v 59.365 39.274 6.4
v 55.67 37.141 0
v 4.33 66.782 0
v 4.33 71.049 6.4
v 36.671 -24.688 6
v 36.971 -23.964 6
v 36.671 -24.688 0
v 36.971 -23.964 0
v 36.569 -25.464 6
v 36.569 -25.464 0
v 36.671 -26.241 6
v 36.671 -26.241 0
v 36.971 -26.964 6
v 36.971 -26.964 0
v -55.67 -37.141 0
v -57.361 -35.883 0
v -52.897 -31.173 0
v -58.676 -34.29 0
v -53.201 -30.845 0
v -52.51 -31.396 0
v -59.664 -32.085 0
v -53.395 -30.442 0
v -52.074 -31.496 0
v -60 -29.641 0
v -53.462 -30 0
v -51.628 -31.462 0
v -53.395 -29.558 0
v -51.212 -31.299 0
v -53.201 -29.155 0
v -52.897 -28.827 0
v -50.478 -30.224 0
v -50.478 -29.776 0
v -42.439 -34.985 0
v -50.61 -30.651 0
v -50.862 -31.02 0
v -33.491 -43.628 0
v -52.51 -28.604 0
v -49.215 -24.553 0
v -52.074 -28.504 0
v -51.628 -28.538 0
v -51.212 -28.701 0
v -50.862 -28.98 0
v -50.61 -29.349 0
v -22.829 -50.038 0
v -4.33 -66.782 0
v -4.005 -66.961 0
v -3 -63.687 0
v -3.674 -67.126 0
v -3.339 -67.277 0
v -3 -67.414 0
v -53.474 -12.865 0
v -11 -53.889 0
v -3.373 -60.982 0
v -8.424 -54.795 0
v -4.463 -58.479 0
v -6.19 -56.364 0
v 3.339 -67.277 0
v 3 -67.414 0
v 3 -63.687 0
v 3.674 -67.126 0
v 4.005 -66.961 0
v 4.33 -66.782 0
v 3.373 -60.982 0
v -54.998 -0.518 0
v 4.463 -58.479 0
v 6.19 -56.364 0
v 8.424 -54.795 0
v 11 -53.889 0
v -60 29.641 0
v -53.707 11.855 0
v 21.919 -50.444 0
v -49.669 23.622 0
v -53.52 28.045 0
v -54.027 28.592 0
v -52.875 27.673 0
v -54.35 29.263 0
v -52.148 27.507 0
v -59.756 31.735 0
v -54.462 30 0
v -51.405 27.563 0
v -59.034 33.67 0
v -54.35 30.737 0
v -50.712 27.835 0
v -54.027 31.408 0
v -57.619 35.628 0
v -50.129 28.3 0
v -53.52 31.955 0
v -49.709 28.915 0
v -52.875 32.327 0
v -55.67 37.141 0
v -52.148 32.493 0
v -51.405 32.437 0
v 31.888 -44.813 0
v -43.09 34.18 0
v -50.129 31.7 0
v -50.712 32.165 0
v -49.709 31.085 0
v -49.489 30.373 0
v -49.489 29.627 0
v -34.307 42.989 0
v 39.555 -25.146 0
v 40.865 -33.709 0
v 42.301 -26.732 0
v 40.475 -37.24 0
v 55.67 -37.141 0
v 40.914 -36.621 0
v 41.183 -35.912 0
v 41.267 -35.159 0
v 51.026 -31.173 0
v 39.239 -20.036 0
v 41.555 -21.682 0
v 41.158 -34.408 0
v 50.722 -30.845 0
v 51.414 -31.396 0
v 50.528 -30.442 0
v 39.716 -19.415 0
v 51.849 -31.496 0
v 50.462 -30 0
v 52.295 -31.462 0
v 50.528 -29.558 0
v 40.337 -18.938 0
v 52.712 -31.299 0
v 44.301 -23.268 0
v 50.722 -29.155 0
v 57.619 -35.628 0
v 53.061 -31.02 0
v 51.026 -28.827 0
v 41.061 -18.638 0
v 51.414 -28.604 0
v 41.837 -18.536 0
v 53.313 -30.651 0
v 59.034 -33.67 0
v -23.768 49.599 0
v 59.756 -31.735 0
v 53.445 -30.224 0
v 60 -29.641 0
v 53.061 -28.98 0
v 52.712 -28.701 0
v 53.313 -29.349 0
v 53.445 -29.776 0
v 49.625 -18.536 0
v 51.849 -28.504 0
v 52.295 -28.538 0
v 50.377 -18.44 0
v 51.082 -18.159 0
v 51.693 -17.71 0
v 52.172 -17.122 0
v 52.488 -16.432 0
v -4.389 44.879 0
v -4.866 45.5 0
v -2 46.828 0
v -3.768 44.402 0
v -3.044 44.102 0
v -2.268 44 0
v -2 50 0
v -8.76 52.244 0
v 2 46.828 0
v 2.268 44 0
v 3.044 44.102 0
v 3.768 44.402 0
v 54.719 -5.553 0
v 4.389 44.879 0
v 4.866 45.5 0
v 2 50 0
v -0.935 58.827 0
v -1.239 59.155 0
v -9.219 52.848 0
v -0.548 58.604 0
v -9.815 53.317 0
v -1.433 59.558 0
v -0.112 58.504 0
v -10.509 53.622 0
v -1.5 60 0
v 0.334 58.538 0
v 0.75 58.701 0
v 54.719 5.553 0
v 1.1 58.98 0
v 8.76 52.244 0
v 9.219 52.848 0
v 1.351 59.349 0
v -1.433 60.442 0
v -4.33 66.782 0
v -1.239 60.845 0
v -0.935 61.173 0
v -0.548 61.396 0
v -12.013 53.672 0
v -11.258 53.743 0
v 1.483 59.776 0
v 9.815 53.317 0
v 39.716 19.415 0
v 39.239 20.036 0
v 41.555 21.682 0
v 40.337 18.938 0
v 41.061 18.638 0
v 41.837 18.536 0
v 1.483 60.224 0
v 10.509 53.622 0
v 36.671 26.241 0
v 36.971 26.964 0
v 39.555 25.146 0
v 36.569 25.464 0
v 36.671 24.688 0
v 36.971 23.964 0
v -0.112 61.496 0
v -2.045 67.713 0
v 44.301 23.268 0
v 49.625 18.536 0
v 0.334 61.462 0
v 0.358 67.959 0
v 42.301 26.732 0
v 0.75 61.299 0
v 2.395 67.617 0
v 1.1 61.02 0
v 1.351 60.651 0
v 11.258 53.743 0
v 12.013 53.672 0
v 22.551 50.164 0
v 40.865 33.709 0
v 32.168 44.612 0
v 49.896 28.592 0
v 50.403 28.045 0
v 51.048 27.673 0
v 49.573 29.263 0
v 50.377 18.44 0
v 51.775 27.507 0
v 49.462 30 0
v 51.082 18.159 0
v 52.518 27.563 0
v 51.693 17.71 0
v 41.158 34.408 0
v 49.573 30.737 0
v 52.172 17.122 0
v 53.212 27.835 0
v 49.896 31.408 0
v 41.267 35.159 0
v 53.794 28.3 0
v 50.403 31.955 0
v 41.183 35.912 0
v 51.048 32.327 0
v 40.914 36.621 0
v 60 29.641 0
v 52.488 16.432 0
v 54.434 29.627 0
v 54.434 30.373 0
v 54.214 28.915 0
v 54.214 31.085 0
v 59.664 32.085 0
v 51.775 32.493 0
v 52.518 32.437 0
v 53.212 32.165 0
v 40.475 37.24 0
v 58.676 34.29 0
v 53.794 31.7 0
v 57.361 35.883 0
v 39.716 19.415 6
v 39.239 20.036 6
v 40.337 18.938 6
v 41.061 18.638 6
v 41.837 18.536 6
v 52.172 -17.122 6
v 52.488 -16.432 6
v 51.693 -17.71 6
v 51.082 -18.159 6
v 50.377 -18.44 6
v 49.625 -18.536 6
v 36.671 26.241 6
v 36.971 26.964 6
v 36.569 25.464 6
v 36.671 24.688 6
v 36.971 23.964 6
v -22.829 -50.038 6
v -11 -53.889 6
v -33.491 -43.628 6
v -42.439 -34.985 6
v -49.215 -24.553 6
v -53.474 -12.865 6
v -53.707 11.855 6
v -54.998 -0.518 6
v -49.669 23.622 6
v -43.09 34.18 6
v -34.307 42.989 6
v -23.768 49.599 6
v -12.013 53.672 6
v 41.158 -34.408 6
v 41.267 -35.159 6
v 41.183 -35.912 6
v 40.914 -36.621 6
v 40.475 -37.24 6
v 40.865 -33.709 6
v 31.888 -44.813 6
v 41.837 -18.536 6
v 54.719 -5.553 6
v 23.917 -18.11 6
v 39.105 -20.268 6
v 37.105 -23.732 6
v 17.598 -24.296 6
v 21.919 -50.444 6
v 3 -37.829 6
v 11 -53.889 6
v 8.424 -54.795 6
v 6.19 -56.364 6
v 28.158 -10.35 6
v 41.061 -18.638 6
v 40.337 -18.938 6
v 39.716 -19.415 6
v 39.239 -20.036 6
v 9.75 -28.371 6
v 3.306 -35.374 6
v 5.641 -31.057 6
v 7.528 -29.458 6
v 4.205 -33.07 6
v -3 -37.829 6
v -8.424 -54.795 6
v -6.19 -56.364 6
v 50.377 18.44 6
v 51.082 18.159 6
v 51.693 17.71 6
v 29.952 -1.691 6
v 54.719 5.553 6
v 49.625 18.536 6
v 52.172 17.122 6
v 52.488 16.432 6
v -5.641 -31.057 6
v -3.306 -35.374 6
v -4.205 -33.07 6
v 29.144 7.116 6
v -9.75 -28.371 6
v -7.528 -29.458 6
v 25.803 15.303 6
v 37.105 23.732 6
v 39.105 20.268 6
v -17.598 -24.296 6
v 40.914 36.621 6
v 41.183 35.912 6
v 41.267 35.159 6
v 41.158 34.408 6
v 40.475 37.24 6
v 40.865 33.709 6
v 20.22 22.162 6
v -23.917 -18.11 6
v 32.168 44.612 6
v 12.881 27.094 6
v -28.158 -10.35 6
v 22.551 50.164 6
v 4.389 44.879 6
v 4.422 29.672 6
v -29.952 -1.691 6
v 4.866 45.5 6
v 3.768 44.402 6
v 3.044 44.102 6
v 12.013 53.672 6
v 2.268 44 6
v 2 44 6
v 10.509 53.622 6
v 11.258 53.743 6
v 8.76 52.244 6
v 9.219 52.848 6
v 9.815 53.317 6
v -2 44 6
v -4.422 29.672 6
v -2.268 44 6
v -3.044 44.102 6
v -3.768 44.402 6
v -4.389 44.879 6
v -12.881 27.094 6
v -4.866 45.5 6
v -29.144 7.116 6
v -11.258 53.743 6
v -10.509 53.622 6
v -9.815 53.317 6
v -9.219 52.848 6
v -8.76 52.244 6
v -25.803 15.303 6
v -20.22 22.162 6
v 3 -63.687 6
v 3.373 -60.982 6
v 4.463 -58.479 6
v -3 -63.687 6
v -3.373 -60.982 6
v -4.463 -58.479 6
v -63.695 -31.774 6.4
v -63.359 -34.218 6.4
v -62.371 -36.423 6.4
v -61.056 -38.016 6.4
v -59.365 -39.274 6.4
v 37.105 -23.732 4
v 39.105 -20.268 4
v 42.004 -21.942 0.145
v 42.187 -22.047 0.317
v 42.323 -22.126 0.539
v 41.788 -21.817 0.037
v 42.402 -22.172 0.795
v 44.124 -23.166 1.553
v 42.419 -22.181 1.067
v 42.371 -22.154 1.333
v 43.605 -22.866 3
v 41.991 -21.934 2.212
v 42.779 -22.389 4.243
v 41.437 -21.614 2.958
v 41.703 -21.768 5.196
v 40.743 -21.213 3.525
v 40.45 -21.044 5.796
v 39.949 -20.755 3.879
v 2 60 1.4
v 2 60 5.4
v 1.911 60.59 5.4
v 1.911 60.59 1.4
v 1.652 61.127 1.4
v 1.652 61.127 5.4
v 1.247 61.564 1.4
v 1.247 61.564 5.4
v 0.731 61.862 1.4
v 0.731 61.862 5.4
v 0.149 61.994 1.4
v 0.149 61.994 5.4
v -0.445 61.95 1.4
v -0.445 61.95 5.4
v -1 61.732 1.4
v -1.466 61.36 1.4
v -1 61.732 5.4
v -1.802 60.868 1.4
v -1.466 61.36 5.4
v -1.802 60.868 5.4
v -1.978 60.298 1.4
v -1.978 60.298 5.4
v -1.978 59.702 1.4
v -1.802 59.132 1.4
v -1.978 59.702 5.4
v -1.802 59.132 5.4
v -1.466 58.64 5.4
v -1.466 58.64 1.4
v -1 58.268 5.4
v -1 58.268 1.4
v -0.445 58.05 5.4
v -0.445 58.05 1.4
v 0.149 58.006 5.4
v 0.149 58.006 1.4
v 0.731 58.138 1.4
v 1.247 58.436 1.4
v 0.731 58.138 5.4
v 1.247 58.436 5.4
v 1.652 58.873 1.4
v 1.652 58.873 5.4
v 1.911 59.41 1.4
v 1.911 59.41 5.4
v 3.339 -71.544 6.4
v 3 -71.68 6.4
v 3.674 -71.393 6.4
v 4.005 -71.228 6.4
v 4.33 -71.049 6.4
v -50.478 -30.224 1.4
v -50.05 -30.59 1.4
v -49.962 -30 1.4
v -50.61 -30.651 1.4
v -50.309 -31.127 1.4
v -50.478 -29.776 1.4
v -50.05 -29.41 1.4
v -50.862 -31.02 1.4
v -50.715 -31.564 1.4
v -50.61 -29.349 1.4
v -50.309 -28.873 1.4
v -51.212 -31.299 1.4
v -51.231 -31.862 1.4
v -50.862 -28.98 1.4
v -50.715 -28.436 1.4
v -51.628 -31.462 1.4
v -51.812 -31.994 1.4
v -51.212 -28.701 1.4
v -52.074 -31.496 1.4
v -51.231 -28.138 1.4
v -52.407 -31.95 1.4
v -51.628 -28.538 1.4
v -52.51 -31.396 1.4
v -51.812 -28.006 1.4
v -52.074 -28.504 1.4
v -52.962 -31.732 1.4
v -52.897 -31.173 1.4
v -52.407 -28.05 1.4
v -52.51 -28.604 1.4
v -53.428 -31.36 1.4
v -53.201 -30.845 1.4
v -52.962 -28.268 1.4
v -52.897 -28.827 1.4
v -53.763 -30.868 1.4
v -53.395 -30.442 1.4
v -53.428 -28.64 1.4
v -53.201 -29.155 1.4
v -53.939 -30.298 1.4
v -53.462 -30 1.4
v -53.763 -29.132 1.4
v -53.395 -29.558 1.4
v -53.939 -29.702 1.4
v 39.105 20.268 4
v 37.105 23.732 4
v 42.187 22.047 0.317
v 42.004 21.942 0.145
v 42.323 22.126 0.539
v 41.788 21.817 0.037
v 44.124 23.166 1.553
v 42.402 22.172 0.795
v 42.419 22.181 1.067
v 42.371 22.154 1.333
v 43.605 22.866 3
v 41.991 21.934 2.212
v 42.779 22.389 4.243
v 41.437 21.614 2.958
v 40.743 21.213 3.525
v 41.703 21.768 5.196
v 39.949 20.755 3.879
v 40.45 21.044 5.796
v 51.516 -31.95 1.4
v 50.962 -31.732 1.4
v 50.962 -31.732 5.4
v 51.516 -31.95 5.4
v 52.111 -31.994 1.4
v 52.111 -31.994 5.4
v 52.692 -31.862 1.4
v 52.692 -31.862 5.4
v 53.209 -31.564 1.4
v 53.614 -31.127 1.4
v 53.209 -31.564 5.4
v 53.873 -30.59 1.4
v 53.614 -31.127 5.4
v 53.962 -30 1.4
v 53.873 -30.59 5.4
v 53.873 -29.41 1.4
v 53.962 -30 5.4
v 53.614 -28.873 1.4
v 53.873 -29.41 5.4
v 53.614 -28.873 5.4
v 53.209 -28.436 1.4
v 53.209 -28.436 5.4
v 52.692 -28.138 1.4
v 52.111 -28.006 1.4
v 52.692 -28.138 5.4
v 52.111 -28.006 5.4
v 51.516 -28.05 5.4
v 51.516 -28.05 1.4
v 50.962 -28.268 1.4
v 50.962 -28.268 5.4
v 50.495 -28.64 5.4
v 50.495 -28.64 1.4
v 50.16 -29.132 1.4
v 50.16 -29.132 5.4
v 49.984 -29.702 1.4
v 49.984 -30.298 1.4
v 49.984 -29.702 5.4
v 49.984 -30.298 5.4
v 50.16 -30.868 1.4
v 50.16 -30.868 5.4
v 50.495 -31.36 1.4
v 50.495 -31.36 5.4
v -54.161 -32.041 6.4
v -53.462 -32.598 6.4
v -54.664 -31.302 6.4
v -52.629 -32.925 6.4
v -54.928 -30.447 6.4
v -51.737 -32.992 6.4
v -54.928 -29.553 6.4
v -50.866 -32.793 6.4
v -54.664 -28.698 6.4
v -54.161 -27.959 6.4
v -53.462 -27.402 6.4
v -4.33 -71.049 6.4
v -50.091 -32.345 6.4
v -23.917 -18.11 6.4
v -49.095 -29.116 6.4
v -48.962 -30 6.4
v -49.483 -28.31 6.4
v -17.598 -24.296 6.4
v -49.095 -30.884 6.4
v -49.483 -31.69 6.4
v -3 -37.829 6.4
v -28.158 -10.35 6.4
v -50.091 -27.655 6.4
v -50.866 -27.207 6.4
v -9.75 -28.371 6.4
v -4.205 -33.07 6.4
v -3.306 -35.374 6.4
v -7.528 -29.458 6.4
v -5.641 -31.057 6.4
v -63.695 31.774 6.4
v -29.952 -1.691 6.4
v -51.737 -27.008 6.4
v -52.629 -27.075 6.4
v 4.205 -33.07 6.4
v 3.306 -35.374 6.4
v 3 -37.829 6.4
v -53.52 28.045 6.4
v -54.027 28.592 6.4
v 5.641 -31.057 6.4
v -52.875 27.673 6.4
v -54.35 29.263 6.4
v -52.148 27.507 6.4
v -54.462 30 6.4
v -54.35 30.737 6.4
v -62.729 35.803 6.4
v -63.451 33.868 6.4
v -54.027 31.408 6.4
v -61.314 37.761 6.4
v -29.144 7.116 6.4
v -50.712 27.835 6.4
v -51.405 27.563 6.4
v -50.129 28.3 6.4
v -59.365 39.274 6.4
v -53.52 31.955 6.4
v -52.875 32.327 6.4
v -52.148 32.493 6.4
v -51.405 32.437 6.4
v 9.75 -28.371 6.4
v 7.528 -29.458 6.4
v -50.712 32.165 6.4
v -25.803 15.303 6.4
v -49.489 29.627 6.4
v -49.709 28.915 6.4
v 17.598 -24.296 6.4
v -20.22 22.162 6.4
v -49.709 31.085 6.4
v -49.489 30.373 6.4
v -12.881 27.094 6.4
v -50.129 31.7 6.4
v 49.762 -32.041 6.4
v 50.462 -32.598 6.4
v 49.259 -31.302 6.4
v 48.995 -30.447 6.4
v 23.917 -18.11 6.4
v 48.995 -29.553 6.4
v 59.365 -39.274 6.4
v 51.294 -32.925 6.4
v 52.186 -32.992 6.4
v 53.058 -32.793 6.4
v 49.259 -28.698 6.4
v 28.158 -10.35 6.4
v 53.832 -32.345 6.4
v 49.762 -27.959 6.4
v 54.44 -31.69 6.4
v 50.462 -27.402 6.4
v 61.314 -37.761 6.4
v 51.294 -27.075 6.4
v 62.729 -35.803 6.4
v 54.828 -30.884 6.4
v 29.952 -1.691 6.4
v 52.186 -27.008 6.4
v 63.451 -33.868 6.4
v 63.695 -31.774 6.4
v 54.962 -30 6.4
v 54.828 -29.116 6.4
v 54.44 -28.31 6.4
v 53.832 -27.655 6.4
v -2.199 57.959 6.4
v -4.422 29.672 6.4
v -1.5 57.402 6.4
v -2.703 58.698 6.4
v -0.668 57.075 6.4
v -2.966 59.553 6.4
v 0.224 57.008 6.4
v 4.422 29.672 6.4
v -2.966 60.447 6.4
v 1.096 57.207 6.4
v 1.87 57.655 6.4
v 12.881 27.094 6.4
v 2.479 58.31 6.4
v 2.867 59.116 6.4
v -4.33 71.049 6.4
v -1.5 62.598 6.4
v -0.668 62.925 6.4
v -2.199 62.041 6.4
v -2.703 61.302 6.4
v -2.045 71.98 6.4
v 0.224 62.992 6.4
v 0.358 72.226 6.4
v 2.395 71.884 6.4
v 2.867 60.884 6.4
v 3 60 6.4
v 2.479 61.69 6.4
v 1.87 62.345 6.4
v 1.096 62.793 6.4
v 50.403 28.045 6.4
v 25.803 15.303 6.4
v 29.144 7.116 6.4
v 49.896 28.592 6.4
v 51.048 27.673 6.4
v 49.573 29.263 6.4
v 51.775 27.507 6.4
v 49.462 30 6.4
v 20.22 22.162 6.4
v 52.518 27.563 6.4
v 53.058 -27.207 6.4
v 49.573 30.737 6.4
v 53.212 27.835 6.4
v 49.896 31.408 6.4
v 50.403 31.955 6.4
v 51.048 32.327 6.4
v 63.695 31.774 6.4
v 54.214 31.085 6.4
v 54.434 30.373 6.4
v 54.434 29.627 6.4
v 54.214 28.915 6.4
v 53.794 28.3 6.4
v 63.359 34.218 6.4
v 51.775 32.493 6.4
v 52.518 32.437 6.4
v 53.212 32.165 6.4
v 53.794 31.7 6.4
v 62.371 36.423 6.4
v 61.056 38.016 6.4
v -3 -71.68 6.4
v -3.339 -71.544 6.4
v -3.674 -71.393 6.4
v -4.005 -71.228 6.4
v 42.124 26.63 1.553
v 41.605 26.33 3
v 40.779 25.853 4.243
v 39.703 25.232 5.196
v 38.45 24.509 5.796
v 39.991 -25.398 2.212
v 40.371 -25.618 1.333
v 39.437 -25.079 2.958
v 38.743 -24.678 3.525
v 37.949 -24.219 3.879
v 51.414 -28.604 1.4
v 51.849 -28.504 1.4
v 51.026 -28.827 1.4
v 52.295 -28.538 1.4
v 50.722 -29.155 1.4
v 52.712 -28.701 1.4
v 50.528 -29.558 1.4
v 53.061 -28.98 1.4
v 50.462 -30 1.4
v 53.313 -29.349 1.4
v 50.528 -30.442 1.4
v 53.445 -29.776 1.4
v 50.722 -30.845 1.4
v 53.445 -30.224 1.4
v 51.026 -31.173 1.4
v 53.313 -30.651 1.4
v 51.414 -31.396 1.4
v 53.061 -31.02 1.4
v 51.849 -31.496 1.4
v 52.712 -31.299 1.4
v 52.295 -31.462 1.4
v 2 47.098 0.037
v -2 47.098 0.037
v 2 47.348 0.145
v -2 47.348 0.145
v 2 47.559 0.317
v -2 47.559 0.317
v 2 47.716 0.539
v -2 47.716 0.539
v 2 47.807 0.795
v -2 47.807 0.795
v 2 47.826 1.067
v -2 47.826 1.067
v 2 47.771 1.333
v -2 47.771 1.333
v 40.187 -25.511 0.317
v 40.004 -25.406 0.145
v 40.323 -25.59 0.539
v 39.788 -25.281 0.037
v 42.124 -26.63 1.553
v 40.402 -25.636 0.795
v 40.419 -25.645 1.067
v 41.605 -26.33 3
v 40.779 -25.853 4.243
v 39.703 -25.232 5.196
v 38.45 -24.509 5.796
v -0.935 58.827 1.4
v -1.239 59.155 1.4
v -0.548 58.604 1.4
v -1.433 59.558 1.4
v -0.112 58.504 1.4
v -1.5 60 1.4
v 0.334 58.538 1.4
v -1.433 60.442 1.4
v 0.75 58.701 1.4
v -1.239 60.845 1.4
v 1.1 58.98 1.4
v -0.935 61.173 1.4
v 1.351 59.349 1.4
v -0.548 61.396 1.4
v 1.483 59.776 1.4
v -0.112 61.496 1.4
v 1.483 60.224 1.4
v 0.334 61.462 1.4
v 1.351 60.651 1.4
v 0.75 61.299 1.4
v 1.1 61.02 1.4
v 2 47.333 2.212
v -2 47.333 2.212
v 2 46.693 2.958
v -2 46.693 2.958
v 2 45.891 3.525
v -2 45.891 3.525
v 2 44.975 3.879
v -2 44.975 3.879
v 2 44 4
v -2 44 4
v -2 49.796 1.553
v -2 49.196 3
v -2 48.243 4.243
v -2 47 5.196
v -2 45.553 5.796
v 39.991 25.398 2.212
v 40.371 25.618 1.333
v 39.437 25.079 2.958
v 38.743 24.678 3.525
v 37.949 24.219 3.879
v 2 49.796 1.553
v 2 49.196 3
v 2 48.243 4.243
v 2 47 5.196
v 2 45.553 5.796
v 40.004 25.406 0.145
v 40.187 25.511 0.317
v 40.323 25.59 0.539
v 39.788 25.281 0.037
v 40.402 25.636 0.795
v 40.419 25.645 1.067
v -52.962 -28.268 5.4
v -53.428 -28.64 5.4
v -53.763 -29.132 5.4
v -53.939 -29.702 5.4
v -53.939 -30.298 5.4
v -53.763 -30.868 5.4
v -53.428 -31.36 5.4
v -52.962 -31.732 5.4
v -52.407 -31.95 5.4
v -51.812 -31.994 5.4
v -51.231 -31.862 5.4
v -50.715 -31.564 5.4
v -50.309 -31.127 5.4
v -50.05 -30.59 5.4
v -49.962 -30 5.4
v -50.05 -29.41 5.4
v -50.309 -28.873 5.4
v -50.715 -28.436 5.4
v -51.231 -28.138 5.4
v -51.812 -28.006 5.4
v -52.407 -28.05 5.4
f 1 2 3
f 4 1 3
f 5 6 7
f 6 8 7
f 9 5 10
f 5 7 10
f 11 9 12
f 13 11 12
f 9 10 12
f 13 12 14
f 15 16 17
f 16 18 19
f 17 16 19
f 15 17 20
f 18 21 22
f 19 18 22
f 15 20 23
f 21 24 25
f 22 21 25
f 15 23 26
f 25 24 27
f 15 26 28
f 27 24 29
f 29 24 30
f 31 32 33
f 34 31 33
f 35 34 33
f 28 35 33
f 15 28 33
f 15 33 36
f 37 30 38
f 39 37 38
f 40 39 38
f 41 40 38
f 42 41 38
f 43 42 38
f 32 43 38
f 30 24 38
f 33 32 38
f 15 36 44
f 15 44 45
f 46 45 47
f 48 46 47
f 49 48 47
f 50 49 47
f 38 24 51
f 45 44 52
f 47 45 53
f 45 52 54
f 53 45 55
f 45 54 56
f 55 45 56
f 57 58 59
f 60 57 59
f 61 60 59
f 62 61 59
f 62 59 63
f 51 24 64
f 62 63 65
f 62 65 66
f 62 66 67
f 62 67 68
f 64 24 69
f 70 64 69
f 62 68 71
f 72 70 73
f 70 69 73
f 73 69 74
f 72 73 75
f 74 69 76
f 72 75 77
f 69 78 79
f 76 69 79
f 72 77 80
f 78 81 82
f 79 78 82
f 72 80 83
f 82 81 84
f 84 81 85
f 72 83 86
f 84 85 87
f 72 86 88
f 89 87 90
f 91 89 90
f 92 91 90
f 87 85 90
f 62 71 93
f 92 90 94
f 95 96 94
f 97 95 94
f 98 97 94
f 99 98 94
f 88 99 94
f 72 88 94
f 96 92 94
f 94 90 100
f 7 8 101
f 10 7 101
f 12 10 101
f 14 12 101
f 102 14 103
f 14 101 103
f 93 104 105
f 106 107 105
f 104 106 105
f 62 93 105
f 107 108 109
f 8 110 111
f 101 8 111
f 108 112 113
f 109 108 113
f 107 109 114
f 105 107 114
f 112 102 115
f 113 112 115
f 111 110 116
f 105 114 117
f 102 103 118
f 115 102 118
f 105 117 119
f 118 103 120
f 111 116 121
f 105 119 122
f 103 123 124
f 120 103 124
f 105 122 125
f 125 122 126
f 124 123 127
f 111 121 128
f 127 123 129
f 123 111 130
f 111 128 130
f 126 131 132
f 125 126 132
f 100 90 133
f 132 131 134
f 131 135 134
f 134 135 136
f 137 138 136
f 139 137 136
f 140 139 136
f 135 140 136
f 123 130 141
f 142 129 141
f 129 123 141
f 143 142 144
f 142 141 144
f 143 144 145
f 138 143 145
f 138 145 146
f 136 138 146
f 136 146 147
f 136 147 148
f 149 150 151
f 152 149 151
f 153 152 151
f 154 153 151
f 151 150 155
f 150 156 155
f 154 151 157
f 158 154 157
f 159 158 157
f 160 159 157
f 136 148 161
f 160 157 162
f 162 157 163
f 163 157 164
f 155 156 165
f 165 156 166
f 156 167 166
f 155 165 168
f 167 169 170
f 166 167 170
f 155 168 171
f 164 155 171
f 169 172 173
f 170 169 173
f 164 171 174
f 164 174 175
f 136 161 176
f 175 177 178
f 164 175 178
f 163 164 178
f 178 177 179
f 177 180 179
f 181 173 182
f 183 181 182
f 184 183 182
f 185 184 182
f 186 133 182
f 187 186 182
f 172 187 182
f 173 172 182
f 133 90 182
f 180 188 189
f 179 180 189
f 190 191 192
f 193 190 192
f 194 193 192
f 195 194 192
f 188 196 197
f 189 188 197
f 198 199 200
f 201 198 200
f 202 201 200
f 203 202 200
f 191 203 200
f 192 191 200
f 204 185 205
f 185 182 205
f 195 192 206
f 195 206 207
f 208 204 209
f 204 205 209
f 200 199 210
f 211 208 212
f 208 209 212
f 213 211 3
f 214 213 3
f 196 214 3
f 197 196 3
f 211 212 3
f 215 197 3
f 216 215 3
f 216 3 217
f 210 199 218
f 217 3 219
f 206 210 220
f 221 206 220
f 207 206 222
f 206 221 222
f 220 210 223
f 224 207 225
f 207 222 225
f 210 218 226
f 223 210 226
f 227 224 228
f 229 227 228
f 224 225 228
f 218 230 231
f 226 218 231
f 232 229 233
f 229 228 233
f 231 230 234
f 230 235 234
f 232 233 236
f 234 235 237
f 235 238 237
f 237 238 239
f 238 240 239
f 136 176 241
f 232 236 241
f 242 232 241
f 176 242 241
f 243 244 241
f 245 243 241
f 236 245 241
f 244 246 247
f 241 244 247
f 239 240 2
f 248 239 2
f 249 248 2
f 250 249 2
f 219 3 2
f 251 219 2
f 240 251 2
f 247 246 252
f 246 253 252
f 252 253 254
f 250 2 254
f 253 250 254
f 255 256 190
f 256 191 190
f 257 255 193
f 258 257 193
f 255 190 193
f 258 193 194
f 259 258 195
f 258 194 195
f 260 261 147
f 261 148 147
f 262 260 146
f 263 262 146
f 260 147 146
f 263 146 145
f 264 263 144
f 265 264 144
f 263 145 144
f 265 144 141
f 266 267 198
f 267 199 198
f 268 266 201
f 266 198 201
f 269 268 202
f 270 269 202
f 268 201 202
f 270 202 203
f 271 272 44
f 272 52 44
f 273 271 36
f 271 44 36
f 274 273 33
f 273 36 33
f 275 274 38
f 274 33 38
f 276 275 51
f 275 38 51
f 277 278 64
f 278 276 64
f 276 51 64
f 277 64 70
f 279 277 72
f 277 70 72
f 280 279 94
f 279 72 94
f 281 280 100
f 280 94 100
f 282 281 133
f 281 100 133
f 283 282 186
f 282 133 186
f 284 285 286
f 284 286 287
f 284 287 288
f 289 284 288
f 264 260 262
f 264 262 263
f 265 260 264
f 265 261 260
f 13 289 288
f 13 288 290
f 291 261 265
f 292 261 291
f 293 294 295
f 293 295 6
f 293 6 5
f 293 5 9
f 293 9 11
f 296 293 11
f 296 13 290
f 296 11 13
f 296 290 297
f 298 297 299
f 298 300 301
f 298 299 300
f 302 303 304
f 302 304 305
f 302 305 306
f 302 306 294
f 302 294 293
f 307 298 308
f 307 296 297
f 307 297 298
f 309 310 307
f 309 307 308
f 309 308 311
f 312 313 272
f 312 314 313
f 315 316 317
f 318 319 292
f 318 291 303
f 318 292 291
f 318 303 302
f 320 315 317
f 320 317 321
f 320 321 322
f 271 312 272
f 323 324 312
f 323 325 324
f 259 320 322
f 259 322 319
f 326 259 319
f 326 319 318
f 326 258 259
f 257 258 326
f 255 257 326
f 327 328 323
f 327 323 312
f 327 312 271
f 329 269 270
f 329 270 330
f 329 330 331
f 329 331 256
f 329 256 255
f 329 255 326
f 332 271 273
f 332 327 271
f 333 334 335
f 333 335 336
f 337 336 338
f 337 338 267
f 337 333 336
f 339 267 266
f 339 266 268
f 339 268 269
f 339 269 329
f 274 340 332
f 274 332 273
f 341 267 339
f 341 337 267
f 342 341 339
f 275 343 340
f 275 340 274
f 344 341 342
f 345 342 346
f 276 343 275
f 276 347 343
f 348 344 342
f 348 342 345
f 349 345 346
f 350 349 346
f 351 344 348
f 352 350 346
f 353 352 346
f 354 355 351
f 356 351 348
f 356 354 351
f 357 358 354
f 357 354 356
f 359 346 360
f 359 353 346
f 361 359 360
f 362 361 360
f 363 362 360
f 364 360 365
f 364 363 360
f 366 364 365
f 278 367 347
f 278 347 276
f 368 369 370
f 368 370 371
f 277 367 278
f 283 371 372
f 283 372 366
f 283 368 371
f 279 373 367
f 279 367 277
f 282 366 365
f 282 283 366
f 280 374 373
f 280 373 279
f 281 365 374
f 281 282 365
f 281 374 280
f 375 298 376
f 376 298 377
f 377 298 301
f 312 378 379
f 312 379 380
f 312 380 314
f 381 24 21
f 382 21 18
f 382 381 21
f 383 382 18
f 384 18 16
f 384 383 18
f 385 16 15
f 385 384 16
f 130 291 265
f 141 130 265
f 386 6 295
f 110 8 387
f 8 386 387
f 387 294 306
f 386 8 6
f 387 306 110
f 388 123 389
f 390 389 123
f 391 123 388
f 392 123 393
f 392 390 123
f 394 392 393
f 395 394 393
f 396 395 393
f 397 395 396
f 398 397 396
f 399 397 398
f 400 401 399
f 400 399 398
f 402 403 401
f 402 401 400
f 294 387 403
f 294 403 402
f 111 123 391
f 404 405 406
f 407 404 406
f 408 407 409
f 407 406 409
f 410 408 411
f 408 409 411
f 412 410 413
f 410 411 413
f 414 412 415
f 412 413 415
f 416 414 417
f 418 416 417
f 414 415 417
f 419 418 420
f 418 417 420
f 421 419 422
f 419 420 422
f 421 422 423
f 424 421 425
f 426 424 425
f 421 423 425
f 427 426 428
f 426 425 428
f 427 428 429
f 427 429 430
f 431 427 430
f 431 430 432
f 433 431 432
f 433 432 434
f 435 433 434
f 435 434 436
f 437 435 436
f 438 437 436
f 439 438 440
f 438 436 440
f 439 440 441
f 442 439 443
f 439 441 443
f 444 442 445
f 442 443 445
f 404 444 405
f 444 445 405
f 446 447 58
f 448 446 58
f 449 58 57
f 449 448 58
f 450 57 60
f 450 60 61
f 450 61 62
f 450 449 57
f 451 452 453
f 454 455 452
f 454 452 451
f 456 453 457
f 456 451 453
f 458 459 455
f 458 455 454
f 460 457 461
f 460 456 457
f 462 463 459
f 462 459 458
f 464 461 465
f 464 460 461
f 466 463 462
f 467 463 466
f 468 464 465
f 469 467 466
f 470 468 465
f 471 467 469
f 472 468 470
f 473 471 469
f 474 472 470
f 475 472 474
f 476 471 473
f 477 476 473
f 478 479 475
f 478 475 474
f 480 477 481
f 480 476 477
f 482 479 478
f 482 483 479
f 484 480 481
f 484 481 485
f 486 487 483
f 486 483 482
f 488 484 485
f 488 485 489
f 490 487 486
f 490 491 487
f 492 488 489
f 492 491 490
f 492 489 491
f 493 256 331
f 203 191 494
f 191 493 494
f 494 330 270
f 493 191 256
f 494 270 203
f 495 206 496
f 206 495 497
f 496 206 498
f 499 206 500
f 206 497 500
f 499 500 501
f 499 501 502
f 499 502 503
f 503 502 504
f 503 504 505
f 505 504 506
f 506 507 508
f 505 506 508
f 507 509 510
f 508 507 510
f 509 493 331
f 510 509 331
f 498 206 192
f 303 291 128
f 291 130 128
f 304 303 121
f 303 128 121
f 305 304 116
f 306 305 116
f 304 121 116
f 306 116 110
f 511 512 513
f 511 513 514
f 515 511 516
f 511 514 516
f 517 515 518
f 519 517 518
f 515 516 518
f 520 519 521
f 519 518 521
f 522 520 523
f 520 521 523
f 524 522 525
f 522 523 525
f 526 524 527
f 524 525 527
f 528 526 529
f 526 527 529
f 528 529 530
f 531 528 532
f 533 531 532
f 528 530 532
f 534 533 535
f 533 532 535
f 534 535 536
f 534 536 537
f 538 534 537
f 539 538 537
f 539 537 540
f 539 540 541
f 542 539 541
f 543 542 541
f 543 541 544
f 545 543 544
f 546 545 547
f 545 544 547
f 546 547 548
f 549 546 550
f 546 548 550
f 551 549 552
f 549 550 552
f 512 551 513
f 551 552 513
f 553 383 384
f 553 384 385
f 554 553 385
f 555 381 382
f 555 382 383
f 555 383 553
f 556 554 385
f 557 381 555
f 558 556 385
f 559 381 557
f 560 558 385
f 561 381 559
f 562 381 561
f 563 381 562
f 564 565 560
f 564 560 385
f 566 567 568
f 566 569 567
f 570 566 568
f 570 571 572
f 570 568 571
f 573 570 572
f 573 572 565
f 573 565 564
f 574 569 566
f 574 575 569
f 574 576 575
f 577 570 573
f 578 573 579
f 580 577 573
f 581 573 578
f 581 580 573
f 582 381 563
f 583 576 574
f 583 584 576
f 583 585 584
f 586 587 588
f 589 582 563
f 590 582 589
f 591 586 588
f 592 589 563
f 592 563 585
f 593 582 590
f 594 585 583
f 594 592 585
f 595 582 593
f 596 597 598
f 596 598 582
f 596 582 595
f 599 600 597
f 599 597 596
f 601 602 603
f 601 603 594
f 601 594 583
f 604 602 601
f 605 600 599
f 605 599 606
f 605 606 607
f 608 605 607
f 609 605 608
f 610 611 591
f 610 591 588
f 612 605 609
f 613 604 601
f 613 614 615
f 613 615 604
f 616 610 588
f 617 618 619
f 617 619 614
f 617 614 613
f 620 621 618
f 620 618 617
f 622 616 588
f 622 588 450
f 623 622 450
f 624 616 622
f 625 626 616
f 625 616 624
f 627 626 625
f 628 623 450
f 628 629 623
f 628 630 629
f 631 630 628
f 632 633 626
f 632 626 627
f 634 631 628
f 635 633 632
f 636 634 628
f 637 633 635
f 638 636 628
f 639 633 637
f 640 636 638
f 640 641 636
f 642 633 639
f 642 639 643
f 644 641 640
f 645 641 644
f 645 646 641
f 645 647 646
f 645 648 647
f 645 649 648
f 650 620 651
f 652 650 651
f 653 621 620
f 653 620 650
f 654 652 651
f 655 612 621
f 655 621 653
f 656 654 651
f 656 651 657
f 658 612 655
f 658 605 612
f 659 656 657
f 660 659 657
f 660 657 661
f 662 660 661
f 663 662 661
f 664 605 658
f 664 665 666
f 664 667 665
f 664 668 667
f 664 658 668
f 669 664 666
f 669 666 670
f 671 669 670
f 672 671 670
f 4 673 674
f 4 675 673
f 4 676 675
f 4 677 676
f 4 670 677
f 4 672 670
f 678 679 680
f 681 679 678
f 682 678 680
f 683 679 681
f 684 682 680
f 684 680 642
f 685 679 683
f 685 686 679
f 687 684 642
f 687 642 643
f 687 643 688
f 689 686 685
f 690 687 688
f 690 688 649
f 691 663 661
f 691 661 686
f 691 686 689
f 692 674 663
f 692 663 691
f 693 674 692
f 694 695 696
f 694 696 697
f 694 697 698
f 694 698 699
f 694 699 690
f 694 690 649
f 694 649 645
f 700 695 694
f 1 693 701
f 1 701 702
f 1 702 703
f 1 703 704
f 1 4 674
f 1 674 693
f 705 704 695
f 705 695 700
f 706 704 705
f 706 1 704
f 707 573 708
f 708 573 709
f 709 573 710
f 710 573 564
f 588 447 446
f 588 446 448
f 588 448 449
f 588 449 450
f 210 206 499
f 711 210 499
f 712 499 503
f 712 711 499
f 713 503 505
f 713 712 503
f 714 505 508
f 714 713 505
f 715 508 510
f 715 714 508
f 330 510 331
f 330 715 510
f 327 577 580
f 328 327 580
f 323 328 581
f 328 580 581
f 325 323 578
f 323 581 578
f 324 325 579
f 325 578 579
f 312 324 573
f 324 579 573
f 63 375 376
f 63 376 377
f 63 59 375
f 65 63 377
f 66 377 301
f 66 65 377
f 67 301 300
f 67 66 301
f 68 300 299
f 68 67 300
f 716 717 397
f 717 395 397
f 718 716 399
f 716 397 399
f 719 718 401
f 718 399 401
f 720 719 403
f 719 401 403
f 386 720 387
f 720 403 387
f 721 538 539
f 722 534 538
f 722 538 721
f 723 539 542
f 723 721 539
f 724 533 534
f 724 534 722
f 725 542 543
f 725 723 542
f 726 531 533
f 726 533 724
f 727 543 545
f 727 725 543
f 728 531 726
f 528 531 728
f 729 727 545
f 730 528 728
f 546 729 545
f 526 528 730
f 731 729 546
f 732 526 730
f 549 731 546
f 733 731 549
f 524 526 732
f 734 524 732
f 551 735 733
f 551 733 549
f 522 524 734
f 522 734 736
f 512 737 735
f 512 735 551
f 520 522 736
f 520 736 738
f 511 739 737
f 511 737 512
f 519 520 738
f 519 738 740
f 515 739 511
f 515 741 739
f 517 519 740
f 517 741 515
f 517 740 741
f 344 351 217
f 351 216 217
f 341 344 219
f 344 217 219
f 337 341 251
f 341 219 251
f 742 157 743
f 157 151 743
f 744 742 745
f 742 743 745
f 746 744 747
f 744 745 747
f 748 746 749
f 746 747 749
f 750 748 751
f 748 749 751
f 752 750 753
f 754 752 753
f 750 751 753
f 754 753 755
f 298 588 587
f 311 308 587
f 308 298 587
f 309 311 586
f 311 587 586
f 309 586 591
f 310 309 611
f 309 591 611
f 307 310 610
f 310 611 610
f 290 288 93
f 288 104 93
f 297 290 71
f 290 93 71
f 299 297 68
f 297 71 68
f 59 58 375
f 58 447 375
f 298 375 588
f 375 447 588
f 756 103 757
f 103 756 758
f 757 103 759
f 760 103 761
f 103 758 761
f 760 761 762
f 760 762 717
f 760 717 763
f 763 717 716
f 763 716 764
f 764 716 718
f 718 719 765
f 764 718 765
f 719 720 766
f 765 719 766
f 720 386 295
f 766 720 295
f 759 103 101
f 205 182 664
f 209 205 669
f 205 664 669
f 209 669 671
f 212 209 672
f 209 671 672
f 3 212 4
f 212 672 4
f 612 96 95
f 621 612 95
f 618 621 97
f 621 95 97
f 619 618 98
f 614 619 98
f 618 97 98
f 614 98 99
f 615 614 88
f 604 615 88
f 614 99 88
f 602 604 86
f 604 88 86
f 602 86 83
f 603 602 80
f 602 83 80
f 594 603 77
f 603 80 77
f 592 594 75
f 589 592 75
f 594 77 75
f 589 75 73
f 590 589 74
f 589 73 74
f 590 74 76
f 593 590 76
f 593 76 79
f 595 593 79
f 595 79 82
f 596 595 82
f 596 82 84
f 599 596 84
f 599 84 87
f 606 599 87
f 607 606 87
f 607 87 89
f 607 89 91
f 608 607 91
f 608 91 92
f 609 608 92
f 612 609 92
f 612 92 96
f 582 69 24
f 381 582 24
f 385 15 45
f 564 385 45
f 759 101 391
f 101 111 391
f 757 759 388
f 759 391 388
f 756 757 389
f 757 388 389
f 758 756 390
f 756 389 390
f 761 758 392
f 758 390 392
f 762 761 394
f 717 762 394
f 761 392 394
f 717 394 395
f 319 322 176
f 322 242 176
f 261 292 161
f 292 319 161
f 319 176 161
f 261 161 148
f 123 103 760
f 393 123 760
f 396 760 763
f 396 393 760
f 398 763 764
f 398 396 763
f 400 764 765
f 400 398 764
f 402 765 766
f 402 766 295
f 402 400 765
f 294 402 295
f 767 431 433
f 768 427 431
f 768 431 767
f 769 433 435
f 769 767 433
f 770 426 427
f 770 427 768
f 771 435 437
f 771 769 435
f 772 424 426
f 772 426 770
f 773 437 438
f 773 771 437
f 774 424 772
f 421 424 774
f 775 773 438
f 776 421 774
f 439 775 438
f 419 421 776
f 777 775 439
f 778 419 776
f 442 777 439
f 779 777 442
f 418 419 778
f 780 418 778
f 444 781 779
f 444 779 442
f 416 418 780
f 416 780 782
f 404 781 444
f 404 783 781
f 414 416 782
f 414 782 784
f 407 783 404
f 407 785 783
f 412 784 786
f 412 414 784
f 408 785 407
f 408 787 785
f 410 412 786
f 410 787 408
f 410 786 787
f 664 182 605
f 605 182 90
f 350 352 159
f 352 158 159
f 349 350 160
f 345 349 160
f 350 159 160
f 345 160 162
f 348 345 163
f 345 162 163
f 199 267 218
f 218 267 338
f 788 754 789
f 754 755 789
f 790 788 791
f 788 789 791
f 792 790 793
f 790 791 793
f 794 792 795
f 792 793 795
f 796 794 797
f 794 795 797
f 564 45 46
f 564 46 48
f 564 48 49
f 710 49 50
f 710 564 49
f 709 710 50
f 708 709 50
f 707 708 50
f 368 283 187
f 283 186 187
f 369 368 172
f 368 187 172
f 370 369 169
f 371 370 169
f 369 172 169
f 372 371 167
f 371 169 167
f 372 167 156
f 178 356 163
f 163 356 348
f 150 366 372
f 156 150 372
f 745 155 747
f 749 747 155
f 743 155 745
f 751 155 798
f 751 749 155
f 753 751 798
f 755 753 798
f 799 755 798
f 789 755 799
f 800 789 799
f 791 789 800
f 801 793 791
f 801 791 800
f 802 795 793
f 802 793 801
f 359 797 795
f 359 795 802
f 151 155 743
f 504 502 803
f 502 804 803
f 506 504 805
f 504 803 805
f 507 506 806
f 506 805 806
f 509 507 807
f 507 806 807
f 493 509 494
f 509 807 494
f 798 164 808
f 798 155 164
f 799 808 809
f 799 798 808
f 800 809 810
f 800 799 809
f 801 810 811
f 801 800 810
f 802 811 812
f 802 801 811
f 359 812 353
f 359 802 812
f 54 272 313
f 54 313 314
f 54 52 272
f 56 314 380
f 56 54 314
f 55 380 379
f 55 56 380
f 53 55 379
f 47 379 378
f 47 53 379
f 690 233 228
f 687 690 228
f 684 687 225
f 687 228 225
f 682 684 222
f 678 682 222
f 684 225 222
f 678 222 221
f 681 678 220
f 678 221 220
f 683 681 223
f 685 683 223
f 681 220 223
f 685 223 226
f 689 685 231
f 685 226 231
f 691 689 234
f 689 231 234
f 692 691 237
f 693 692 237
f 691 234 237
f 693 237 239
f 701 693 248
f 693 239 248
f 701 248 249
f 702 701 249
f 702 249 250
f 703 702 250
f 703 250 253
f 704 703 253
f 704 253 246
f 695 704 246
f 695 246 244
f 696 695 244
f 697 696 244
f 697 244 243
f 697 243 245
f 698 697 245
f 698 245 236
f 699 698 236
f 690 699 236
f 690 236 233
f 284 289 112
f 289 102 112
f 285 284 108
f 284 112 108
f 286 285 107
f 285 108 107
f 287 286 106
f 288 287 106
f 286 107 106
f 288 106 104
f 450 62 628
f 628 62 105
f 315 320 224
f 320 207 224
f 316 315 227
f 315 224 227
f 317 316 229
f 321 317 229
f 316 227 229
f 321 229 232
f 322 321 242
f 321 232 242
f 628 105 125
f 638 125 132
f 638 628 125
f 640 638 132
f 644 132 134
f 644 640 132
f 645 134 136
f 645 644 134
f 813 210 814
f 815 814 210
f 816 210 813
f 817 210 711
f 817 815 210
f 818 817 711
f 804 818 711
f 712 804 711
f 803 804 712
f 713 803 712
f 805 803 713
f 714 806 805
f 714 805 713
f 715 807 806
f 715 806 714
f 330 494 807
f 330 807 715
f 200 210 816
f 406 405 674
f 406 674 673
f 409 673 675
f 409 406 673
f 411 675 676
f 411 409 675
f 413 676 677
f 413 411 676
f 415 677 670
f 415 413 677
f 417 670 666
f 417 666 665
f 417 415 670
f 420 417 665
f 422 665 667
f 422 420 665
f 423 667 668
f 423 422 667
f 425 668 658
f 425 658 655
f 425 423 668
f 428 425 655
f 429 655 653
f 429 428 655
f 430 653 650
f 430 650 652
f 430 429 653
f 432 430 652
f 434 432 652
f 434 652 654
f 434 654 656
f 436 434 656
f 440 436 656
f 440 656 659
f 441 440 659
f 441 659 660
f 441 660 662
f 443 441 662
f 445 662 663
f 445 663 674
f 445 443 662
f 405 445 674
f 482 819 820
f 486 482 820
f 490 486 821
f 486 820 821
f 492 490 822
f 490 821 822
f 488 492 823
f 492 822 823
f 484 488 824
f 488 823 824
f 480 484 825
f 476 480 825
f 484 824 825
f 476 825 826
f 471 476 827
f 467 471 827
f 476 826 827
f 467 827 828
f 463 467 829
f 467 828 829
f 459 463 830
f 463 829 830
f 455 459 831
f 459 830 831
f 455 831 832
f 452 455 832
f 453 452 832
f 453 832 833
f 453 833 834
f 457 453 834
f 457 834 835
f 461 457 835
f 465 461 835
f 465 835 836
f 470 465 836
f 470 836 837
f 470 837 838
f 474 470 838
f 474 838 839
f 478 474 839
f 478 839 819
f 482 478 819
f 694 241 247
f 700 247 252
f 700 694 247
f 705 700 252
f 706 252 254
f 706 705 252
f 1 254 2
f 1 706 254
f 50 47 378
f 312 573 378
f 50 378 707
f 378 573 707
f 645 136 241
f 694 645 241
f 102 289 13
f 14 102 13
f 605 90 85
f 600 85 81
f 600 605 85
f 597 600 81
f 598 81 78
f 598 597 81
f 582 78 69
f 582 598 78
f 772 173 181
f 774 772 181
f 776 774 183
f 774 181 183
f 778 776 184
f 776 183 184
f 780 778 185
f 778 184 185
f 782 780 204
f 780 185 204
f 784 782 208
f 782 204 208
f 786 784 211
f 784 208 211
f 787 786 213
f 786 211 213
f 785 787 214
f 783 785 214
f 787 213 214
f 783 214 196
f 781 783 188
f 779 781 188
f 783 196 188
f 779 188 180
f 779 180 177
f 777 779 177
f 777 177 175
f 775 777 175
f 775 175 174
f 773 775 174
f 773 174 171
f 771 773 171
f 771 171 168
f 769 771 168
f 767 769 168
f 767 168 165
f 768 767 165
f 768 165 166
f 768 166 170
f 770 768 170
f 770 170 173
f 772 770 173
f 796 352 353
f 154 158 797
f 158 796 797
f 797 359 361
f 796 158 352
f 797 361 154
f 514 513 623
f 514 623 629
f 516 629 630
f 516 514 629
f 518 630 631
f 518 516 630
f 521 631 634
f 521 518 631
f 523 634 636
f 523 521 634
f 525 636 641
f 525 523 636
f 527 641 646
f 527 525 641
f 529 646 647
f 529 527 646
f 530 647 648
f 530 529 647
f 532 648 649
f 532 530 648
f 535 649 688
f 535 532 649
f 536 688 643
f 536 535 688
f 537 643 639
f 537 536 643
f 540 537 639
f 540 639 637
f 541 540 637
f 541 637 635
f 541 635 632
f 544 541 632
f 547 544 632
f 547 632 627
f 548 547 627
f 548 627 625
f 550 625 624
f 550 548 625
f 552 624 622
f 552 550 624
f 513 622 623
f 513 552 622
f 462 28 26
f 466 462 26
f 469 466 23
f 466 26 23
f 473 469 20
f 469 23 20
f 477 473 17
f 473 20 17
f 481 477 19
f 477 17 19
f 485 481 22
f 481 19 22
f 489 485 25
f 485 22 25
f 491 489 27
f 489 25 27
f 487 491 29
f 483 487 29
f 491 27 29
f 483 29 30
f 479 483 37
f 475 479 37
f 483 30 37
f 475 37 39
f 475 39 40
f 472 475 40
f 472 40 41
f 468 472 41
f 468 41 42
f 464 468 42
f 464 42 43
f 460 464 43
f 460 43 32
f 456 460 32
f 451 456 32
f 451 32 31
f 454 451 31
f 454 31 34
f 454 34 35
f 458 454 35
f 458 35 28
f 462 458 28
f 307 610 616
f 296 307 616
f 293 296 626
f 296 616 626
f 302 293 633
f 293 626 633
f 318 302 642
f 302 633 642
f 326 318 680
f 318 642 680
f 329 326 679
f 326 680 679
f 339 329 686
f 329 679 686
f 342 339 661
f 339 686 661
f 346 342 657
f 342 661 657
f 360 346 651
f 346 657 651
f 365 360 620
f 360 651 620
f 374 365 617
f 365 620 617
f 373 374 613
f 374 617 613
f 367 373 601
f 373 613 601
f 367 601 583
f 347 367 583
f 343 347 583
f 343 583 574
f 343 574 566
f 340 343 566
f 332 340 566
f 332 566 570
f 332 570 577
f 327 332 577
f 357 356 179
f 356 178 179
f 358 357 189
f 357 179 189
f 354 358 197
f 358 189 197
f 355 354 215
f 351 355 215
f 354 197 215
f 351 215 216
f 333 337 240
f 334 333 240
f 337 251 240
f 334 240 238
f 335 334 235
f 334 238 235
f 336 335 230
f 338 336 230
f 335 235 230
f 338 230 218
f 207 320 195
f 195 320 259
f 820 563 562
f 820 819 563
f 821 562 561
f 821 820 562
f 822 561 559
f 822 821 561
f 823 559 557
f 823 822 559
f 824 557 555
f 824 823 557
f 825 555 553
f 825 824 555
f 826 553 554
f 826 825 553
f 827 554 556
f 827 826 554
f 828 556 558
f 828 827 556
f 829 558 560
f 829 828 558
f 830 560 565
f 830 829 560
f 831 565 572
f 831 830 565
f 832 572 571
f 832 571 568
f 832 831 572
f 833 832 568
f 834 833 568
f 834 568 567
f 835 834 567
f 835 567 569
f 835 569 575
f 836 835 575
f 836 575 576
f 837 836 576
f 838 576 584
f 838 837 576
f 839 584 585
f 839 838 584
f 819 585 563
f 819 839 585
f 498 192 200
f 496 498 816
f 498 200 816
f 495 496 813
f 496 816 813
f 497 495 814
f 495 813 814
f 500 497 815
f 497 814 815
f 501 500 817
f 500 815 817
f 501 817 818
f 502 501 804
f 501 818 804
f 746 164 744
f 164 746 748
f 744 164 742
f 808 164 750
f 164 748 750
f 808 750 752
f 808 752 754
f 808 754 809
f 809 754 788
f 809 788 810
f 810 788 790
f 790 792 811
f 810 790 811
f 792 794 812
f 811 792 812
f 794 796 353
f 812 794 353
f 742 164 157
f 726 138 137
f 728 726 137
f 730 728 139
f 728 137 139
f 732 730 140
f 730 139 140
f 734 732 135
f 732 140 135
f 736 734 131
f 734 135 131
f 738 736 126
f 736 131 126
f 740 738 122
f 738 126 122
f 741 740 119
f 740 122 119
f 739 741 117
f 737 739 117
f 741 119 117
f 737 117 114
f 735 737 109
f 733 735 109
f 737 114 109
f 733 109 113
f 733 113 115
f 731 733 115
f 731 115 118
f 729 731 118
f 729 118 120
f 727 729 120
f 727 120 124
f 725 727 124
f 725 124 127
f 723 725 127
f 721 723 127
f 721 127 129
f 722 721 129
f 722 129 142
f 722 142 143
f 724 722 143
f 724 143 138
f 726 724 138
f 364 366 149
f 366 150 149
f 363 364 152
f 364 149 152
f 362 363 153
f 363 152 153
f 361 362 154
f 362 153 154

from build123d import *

# Parameters (mm, degrees)
BOSS_EXTRUDE1_DEPTH       = 6.4
BOSS_EXTRUDE1_DRAFT       = -30
FILLET1_R                 = 10
SKETCH13_R                = 2
CUT_EXTRUDE3_DEPTH        = 5
SKETCH14_R                = 1.5
CUT_EXTRUDE4_DEPTH        = 97.51813456
SKETCH15_R                = 55
CUT_EXTRUDE5_DEPTH        = 6
CIRPATTERN9_COUNT         = 3
BOSS_EXTRUDE4_DEPTH       = 6
SKETCH21_W                = 4
SKETCH21_H                = 2
FILLET8_R                 = 1
CIRPATTERN11_COUNT        = 3
CIRPATTERN11_ANGLE        = 120
FILLET8_OF_CIRPATTERN11_R = 1
SKETCH16_R                = 2.5
CUT_EXTRUDE6_DEPTH        = 97.51813456
CIRPATTERN10_COUNT        = 3
CUT_EXTRUDE7_DEPTH        = 97.51813456
FILLET9_R                 = 10
FILLET10_R                = 3
CHAMFER2_SIZE             = 1


with BuildPart() as part:
    # Sketch1 → Boss-Extrude1 (with draft: the straight prism first)
    with BuildSketch(Plane.XY):
        Polygon((0, 69.282032303), (-60, 34.641016151), (-60, -34.641016151), (0, -69.282032303), (60, -34.641016151), (60, 34.641016151), align=None)
    extrude(amount=BOSS_EXTRUDE1_DEPTH)
    # Boss-Extrude1: the draft: its side faces are tilted about the plane it starts from
    boss_extrude1_sides = [part.faces().sort_by_distance(p)[0] for p in [
        (-30, 51.961524227, 3.2),
        (-60, 0, 3.2),
        (-30, -51.961524227, 3.2),
        (30, -51.961524227, 3.2),
        (60, 0, 3.2),
        (30, 51.961524227, 3.2),
    ]]
    draft(boss_extrude1_sides, Plane.XY, BOSS_EXTRUDE1_DRAFT)

    # Fillet1
    fillet1_edges = [part.edges().sort_by_distance(p)[0] for p in [
        (61.847520861, 35.707682818, 3.2),
        (61.847520861, -35.707682818, 3.2),
        (0, -71.415365636, 3.2),
        (-61.847520861, -35.707682818, 3.2),
        (-61.847520861, 35.707682818, 3.2),
        (0, 71.415365636, 3.2),
    ]]
    fillet(fillet1_edges, radius=FILLET1_R)

    # Sketch13 → Cut-Extrude3 (cut)
    with BuildSketch(Plane.XY.offset(6.4)):
        with Locations((0, 60)):
            Circle(SKETCH13_R)
    cut_extrude3 = extrude(amount=-CUT_EXTRUDE3_DEPTH, mode=Mode.SUBTRACT)

    # Sketch14 → Cut-Extrude4 (cut, through all)
    with BuildSketch(Plane(origin=(0, 0, 0), x_dir=(-1, 0, 0), z_dir=(0, 0, -1))):
        with Locations((0, 60)):
            Circle(SKETCH14_R)
    cut_extrude4 = extrude(amount=-CUT_EXTRUDE4_DEPTH, mode=Mode.SUBTRACT)

    # Sketch15 → Cut-Extrude5 (cut)
    with BuildSketch(Plane(origin=(0, 0, 0), x_dir=(-1, 0, 0), z_dir=(0, 0, -1))):
        Circle(SKETCH15_R)
    extrude(amount=-CUT_EXTRUDE5_DEPTH, mode=Mode.SUBTRACT)

    # CirPattern9: Cut-Extrude3, Cut-Extrude4 ×3 about axis
    cirpattern9_axis = Axis((0, 0, 0), (0, 0, 1))
    add([cut_extrude3.rotate(cirpattern9_axis, i * 360 / CIRPATTERN9_COUNT) for i in range(1, CIRPATTERN9_COUNT)], mode=Mode.SUBTRACT)
    add([cut_extrude4.rotate(cirpattern9_axis, i * 360 / CIRPATTERN9_COUNT) for i in range(1, CIRPATTERN9_COUNT)], mode=Mode.SUBTRACT)

    # Sketch20 → Boss-Extrude4 (add)
    with BuildSketch(Plane(origin=(0, 0, 6), x_dir=(-1, 0, 0), z_dir=(0, 0, -1))):
        Polygon((-12.082903769, 58), (-4, 44), (4, 44), (12.082903769, 58), align=None)
    boss_extrude4 = extrude(amount=BOSS_EXTRUDE4_DEPTH)

    # Sketch21 → Cut-Revolve1 (revolve, cut)
    with BuildSketch(Plane(origin=(0, 44, 0), x_dir=(-1, 0, 0), z_dir=(0, -1, 0))):
        with Locations((0, -5)):
            Rectangle(SKETCH21_W, SKETCH21_H)
    cut_revolve1 = revolve(axis=Axis((4, 44, 0), (1, 0, 0)), mode=Mode.SUBTRACT)

    # Fillet8
    fillet8_edges = [part.edges().sort_by_distance(p)[0] for p in [
        (0, 48, 0),
    ]]
    fillet(fillet8_edges, radius=FILLET8_R)

    # CirPattern11: Boss-Extrude4, Cut-Revolve1 ×3 about axis
    cirpattern11_axis = Axis((0, 0, 0), (0, 0, -1))
    add([boss_extrude4.rotate(cirpattern11_axis, i * CIRPATTERN11_ANGLE / (CIRPATTERN11_COUNT - 1)) for i in range(1, CIRPATTERN11_COUNT)])
    add([cut_revolve1.rotate(cirpattern11_axis, i * CIRPATTERN11_ANGLE / (CIRPATTERN11_COUNT - 1)) for i in range(1, CIRPATTERN11_COUNT)], mode=Mode.SUBTRACT)

    # Fillet8 of CirPattern11
    fillet8_of_cirpattern11_edges = [part.edges().sort_by_distance(p)[0] for p in [
        (41.569219382, 24, 0),
        (41.569219382, -24, 0),
    ]]
    fillet(fillet8_of_cirpattern11_edges, radius=FILLET8_OF_CIRPATTERN11_R)

    # Sketch16 → Cut-Extrude6 (cut, through all)
    with BuildSketch(Plane(origin=(0, 0, 0), x_dir=(-1, 0, 0), z_dir=(0, 0, -1))):
        with Locations((0, -60)):
            Circle(SKETCH16_R)
    cut_extrude6 = extrude(amount=-CUT_EXTRUDE6_DEPTH, mode=Mode.SUBTRACT)

    # CirPattern10: Cut-Extrude6 ×3 about axis
    cirpattern10_axis = Axis((0, 0, 0), (0, 0, 1))
    for i in range(1, CIRPATTERN10_COUNT):
        add(cut_extrude6.rotate(cirpattern10_axis, i * 360 / CIRPATTERN10_COUNT), mode=Mode.SUBTRACT)

    # Sketch22 → Cut-Extrude7 (cut, through all)
    with BuildSketch(Plane.XY.offset(6.4)):
        with BuildLine():
            Line((-3, -37.828560639), (-3, -80))
            Line((-3, -80), (3, -80))
            Line((3, -80), (3, -37.828560639))
            ThreePointArc((3, -37.828560639), (4.860589702, -32.019085619), (9.75, -28.371420479))
            ThreePointArc((9.75, -28.371420479), (0, 30), (-9.75, -28.371420479))
            ThreePointArc((-9.75, -28.371420479), (-4.860589702, -32.019085619), (-3, -37.828560639))
        make_face()
    extrude(amount=-CUT_EXTRUDE7_DEPTH, mode=Mode.SUBTRACT)

    # Fillet9
    fillet9_edges = [part.edges().sort_by_distance(p)[0] for p in [
        (3, -54.918120871, 3),
        (-3, -54.918120871, 3),
    ]]
    fillet(fillet9_edges, radius=FILLET9_R)

    # Fillet10
    fillet10_edges = [part.edges().sort_by_distance(p)[0] for p in [
        (51.782434001, 18.535898385, 3),
        (41.943775884, 35.576954122, 3),
        (36.105117767, 25.464101615, 3),
        (40.105117767, 18.535898385, 3),
        (41.943775884, -35.576954122, 3),
        (51.782434001, -18.535898385, 3),
        (40.105117767, -18.535898385, 3),
        (36.105117767, -25.464101615, 3),
        (9.838658117, 54.112852507, 3),
        (-9.838658117, 54.112852507, 3),
        (-4, 44, 3),
        (4, 44, 3),
    ]]
    fillet(fillet10_edges, radius=FILLET10_R)

    # Chamfer2
    # the kernel refuses this chamfer: 1 mm, written as the material it takes off along each edge
    with BuildSketch(Plane(origin=(0, 60, 6.4), x_dir=(1, 0, 0), z_dir=(0, -1, 0))) as chamfer2_piece_1:
        Polygon((2 + CHAMFER2_SIZE, 0), (2, -CHAMFER2_SIZE), (2, 0), align=None)
    revolve(axis=Axis((0, 60, 6.4), (0, 0, 1)), mode=Mode.SUBTRACT)
    with BuildSketch(Plane(origin=(51.961524227, -30, 6.4), x_dir=(-0.4999999999999998, -0.8660254037844389, 0), z_dir=(-0.8660254037844389, 0.4999999999999998, 0))) as chamfer2_piece_2:
        Polygon((2 + CHAMFER2_SIZE, 0), (2, -CHAMFER2_SIZE), (2, 0), align=None)
    revolve(axis=Axis((51.961524227, -30, 6.4), (0, 0, 1)), mode=Mode.SUBTRACT)
    with BuildSketch(Plane(origin=(-51.961524227, -30, 6.4), x_dir=(-0.4999999999999998, 0.8660254037844389, 0), z_dir=(0.8660254037844389, 0.4999999999999998, 0))) as chamfer2_piece_3:
        Polygon((2 + CHAMFER2_SIZE, 0), (2, -CHAMFER2_SIZE), (2, 0), align=None)
    revolve(axis=Axis((-51.961524227, -30, 6.4), (0, 0, 1)), mode=Mode.SUBTRACT)


solid = part.part
